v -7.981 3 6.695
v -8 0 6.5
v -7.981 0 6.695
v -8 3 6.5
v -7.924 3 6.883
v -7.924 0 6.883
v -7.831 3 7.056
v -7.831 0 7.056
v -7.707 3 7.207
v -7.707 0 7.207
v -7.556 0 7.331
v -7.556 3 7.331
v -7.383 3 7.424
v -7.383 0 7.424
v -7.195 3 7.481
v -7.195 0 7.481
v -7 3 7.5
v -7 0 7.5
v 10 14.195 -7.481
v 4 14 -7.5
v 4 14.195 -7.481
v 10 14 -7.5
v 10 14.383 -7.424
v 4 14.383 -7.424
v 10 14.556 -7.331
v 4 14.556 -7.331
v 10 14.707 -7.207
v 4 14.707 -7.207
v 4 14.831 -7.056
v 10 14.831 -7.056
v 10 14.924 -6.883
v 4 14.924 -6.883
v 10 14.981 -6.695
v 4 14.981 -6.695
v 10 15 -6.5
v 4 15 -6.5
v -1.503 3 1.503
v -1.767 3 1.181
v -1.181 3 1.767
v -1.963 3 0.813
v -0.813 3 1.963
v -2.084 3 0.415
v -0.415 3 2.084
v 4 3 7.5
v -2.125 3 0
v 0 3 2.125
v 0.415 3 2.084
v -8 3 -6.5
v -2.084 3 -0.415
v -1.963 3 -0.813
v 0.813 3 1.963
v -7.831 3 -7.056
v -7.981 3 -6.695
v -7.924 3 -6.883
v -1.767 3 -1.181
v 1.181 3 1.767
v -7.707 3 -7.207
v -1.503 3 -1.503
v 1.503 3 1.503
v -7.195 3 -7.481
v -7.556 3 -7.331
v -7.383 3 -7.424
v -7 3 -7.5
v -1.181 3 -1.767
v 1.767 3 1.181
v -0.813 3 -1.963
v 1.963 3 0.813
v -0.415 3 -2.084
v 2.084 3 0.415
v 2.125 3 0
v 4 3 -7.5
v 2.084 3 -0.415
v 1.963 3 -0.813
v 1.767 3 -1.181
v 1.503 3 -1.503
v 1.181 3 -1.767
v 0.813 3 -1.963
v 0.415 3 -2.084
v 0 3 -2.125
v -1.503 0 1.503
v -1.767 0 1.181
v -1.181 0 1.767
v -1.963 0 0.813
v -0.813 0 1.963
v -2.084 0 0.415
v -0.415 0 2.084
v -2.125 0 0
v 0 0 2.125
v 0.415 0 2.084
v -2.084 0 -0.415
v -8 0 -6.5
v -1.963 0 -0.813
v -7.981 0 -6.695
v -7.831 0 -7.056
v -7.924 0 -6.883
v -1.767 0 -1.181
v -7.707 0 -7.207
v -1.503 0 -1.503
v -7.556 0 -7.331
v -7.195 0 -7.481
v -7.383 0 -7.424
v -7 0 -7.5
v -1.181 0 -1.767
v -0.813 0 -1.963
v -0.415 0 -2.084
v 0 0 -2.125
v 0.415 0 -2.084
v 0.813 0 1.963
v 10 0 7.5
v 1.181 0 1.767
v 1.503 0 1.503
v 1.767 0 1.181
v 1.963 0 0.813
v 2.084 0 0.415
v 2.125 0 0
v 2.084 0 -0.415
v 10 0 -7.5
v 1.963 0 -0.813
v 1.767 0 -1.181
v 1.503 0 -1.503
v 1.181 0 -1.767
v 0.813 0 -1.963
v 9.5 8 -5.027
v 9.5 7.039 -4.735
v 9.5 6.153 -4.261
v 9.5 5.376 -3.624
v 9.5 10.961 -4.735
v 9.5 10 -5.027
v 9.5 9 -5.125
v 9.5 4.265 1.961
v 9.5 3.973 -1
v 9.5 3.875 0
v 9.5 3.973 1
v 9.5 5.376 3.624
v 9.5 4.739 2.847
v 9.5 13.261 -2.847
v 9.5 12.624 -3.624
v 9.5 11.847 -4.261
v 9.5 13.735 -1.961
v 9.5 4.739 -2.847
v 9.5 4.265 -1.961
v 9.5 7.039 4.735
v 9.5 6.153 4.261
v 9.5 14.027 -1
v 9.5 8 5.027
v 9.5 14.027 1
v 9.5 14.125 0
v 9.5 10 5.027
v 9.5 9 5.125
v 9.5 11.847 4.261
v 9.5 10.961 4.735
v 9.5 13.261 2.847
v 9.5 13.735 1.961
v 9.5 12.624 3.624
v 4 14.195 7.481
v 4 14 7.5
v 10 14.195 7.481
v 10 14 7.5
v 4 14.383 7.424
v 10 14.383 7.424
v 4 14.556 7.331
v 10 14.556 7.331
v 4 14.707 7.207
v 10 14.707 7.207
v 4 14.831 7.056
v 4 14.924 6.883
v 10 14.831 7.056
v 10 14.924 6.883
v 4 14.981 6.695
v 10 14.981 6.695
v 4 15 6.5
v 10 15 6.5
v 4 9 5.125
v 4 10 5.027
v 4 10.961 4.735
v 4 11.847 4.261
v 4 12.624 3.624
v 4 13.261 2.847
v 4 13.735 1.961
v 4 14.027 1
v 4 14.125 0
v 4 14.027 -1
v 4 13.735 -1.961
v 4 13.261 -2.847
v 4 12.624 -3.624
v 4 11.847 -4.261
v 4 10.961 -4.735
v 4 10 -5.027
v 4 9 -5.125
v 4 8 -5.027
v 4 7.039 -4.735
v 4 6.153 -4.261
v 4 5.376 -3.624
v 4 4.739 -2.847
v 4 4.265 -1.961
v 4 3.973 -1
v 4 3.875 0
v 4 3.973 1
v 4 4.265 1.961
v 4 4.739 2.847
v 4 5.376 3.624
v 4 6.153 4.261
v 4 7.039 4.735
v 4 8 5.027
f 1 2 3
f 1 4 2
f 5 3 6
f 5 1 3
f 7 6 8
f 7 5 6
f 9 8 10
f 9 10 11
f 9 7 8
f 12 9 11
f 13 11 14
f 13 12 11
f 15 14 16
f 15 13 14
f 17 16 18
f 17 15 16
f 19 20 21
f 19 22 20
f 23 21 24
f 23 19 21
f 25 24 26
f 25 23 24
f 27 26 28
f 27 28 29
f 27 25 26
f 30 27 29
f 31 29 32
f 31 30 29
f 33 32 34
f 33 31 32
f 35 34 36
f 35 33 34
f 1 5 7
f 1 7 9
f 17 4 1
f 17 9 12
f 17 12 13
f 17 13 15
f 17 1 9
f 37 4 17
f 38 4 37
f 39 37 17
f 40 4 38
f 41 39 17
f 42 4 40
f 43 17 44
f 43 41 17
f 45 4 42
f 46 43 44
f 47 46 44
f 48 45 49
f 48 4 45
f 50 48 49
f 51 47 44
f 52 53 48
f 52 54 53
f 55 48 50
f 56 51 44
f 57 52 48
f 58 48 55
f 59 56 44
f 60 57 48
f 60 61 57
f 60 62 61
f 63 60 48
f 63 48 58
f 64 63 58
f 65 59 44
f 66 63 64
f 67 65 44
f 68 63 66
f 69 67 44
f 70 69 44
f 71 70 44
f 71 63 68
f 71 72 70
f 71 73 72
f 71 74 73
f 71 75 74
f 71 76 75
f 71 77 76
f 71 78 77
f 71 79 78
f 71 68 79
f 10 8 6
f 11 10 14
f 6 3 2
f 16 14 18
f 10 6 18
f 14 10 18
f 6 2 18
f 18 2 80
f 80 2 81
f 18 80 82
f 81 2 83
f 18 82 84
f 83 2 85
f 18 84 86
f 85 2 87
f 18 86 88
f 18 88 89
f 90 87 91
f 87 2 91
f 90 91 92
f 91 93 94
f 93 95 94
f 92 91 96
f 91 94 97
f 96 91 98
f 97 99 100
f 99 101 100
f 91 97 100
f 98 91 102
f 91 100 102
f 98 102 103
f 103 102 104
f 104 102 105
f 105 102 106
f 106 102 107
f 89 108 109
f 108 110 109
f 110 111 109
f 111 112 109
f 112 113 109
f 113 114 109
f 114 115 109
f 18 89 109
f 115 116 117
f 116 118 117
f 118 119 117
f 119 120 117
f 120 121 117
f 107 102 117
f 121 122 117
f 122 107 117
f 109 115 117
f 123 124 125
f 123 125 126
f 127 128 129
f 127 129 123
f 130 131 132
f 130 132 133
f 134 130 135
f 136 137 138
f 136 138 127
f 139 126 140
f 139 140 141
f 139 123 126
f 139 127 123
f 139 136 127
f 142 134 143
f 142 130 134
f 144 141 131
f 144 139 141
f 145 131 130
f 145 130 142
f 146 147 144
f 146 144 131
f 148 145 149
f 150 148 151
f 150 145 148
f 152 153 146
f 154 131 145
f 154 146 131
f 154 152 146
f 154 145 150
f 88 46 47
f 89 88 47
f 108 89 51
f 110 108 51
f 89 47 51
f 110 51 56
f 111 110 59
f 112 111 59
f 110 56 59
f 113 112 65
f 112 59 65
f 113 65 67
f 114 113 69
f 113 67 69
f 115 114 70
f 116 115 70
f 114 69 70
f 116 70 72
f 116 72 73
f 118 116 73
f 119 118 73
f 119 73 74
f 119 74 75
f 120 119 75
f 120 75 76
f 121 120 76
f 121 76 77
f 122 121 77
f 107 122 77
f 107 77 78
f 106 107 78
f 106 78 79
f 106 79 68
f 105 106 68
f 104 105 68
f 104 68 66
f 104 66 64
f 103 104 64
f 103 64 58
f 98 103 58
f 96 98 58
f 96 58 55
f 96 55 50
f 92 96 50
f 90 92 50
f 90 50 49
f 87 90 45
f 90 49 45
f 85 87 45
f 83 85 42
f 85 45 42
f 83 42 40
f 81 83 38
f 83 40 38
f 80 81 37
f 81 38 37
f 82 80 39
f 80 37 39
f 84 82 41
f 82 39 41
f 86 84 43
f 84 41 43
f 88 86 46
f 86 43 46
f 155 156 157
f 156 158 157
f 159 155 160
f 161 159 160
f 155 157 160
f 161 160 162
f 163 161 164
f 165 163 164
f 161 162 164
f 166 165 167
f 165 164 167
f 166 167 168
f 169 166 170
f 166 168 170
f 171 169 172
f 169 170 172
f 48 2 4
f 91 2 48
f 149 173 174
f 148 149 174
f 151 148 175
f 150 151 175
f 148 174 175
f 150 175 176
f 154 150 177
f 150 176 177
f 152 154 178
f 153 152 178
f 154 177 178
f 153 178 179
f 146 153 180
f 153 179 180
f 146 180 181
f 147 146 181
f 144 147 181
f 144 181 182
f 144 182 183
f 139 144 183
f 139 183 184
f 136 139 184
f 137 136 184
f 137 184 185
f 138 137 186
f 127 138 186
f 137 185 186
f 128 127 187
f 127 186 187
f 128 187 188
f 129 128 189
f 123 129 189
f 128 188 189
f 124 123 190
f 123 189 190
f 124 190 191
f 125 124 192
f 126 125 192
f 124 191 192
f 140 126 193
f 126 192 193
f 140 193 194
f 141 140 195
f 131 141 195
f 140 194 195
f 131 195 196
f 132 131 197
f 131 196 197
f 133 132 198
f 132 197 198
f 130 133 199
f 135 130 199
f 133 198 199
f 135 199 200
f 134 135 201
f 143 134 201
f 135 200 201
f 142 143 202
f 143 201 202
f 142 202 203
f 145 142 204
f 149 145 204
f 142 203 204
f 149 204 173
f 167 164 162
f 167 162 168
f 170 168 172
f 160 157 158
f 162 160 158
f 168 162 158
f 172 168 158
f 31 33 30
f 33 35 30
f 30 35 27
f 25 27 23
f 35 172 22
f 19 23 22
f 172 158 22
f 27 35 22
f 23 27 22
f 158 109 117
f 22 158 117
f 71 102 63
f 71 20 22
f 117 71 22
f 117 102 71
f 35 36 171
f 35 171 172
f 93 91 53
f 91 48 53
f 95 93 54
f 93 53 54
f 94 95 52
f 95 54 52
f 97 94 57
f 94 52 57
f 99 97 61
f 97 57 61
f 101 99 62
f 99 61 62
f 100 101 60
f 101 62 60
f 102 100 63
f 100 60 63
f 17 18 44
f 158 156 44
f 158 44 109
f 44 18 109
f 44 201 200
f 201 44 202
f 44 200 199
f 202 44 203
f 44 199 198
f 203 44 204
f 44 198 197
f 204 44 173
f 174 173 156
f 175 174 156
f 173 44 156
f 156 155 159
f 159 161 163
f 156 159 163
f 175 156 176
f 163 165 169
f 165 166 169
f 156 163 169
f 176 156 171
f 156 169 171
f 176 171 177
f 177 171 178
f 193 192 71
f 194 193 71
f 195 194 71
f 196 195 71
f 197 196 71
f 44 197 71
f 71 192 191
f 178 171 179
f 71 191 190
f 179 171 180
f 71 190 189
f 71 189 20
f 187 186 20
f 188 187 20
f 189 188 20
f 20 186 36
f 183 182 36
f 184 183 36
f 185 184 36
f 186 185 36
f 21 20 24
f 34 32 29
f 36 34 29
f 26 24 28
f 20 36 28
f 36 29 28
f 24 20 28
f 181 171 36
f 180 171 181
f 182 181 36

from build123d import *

# Parameters (mm, degrees)
SKETCH_1_W          = 18
SKETCH_1_H          = 15
EXTRUDE_1_DEPTH     = 15
SKETCH_2_W          = 12
SKETCH_2_H          = 15
CUT_EXTRUDE_1_DEPTH = 12
FILLET_1_R          = 1
SKETCH_3_R          = 5.125
CUT_EXTRUDE_2_DEPTH = 5.5
SKETCH_4_R          = 2.125
CUT_EXTRUDE_3_DEPTH = 5.5


with BuildPart() as part:
    # 草圖1 → 填料-伸長1 (new body)
    with BuildSketch(Plane(origin=(0, 0, 0), x_dir=(1, 0, 0), z_dir=(0, 1, 0))):
        with Locations((1, 0)):
            Rectangle(SKETCH_1_W, SKETCH_1_H)
    extrude(amount=EXTRUDE_1_DEPTH)

    # 草圖2 → 除料-伸長1 (cut)
    with BuildSketch(Plane(origin=(0, 15, 0), x_dir=(1, 0, 0), z_dir=(0, 1, 0))):
        with Locations((-2, 0)):
            Rectangle(SKETCH_2_W, SKETCH_2_H)
    extrude(amount=-CUT_EXTRUDE_1_DEPTH, mode=Mode.SUBTRACT)

    # 圓角1
    fillet_1_edges = [part.edges().sort_by_distance(p)[0] for p in [
        (7, 15, 7.5),
        (-8, 1.5, -7.5),
        (-8, 1.5, 7.5),
        (7, 15, -7.5),
    ]]
    fillet(fillet_1_edges, radius=FILLET_1_R)

    # 草圖3 → 除料-伸長2 (cut)
    with BuildSketch(Plane.ZY.offset(-4)):
        with Locations((0, 9)):
            Circle(SKETCH_3_R)
    extrude(amount=-CUT_EXTRUDE_2_DEPTH, mode=Mode.SUBTRACT)

    # 草圖4 → 除料-伸長3 (cut)
    with BuildSketch(Plane(origin=(0, 3, 0), x_dir=(1, 0, 0), z_dir=(0, 1, 0))):
        with Locations(Location((0, 0, 0), (0, 0, 270))):
            Circle(SKETCH_4_R)
    extrude(amount=-CUT_EXTRUDE_3_DEPTH, mode=Mode.SUBTRACT)


solid = part.part
